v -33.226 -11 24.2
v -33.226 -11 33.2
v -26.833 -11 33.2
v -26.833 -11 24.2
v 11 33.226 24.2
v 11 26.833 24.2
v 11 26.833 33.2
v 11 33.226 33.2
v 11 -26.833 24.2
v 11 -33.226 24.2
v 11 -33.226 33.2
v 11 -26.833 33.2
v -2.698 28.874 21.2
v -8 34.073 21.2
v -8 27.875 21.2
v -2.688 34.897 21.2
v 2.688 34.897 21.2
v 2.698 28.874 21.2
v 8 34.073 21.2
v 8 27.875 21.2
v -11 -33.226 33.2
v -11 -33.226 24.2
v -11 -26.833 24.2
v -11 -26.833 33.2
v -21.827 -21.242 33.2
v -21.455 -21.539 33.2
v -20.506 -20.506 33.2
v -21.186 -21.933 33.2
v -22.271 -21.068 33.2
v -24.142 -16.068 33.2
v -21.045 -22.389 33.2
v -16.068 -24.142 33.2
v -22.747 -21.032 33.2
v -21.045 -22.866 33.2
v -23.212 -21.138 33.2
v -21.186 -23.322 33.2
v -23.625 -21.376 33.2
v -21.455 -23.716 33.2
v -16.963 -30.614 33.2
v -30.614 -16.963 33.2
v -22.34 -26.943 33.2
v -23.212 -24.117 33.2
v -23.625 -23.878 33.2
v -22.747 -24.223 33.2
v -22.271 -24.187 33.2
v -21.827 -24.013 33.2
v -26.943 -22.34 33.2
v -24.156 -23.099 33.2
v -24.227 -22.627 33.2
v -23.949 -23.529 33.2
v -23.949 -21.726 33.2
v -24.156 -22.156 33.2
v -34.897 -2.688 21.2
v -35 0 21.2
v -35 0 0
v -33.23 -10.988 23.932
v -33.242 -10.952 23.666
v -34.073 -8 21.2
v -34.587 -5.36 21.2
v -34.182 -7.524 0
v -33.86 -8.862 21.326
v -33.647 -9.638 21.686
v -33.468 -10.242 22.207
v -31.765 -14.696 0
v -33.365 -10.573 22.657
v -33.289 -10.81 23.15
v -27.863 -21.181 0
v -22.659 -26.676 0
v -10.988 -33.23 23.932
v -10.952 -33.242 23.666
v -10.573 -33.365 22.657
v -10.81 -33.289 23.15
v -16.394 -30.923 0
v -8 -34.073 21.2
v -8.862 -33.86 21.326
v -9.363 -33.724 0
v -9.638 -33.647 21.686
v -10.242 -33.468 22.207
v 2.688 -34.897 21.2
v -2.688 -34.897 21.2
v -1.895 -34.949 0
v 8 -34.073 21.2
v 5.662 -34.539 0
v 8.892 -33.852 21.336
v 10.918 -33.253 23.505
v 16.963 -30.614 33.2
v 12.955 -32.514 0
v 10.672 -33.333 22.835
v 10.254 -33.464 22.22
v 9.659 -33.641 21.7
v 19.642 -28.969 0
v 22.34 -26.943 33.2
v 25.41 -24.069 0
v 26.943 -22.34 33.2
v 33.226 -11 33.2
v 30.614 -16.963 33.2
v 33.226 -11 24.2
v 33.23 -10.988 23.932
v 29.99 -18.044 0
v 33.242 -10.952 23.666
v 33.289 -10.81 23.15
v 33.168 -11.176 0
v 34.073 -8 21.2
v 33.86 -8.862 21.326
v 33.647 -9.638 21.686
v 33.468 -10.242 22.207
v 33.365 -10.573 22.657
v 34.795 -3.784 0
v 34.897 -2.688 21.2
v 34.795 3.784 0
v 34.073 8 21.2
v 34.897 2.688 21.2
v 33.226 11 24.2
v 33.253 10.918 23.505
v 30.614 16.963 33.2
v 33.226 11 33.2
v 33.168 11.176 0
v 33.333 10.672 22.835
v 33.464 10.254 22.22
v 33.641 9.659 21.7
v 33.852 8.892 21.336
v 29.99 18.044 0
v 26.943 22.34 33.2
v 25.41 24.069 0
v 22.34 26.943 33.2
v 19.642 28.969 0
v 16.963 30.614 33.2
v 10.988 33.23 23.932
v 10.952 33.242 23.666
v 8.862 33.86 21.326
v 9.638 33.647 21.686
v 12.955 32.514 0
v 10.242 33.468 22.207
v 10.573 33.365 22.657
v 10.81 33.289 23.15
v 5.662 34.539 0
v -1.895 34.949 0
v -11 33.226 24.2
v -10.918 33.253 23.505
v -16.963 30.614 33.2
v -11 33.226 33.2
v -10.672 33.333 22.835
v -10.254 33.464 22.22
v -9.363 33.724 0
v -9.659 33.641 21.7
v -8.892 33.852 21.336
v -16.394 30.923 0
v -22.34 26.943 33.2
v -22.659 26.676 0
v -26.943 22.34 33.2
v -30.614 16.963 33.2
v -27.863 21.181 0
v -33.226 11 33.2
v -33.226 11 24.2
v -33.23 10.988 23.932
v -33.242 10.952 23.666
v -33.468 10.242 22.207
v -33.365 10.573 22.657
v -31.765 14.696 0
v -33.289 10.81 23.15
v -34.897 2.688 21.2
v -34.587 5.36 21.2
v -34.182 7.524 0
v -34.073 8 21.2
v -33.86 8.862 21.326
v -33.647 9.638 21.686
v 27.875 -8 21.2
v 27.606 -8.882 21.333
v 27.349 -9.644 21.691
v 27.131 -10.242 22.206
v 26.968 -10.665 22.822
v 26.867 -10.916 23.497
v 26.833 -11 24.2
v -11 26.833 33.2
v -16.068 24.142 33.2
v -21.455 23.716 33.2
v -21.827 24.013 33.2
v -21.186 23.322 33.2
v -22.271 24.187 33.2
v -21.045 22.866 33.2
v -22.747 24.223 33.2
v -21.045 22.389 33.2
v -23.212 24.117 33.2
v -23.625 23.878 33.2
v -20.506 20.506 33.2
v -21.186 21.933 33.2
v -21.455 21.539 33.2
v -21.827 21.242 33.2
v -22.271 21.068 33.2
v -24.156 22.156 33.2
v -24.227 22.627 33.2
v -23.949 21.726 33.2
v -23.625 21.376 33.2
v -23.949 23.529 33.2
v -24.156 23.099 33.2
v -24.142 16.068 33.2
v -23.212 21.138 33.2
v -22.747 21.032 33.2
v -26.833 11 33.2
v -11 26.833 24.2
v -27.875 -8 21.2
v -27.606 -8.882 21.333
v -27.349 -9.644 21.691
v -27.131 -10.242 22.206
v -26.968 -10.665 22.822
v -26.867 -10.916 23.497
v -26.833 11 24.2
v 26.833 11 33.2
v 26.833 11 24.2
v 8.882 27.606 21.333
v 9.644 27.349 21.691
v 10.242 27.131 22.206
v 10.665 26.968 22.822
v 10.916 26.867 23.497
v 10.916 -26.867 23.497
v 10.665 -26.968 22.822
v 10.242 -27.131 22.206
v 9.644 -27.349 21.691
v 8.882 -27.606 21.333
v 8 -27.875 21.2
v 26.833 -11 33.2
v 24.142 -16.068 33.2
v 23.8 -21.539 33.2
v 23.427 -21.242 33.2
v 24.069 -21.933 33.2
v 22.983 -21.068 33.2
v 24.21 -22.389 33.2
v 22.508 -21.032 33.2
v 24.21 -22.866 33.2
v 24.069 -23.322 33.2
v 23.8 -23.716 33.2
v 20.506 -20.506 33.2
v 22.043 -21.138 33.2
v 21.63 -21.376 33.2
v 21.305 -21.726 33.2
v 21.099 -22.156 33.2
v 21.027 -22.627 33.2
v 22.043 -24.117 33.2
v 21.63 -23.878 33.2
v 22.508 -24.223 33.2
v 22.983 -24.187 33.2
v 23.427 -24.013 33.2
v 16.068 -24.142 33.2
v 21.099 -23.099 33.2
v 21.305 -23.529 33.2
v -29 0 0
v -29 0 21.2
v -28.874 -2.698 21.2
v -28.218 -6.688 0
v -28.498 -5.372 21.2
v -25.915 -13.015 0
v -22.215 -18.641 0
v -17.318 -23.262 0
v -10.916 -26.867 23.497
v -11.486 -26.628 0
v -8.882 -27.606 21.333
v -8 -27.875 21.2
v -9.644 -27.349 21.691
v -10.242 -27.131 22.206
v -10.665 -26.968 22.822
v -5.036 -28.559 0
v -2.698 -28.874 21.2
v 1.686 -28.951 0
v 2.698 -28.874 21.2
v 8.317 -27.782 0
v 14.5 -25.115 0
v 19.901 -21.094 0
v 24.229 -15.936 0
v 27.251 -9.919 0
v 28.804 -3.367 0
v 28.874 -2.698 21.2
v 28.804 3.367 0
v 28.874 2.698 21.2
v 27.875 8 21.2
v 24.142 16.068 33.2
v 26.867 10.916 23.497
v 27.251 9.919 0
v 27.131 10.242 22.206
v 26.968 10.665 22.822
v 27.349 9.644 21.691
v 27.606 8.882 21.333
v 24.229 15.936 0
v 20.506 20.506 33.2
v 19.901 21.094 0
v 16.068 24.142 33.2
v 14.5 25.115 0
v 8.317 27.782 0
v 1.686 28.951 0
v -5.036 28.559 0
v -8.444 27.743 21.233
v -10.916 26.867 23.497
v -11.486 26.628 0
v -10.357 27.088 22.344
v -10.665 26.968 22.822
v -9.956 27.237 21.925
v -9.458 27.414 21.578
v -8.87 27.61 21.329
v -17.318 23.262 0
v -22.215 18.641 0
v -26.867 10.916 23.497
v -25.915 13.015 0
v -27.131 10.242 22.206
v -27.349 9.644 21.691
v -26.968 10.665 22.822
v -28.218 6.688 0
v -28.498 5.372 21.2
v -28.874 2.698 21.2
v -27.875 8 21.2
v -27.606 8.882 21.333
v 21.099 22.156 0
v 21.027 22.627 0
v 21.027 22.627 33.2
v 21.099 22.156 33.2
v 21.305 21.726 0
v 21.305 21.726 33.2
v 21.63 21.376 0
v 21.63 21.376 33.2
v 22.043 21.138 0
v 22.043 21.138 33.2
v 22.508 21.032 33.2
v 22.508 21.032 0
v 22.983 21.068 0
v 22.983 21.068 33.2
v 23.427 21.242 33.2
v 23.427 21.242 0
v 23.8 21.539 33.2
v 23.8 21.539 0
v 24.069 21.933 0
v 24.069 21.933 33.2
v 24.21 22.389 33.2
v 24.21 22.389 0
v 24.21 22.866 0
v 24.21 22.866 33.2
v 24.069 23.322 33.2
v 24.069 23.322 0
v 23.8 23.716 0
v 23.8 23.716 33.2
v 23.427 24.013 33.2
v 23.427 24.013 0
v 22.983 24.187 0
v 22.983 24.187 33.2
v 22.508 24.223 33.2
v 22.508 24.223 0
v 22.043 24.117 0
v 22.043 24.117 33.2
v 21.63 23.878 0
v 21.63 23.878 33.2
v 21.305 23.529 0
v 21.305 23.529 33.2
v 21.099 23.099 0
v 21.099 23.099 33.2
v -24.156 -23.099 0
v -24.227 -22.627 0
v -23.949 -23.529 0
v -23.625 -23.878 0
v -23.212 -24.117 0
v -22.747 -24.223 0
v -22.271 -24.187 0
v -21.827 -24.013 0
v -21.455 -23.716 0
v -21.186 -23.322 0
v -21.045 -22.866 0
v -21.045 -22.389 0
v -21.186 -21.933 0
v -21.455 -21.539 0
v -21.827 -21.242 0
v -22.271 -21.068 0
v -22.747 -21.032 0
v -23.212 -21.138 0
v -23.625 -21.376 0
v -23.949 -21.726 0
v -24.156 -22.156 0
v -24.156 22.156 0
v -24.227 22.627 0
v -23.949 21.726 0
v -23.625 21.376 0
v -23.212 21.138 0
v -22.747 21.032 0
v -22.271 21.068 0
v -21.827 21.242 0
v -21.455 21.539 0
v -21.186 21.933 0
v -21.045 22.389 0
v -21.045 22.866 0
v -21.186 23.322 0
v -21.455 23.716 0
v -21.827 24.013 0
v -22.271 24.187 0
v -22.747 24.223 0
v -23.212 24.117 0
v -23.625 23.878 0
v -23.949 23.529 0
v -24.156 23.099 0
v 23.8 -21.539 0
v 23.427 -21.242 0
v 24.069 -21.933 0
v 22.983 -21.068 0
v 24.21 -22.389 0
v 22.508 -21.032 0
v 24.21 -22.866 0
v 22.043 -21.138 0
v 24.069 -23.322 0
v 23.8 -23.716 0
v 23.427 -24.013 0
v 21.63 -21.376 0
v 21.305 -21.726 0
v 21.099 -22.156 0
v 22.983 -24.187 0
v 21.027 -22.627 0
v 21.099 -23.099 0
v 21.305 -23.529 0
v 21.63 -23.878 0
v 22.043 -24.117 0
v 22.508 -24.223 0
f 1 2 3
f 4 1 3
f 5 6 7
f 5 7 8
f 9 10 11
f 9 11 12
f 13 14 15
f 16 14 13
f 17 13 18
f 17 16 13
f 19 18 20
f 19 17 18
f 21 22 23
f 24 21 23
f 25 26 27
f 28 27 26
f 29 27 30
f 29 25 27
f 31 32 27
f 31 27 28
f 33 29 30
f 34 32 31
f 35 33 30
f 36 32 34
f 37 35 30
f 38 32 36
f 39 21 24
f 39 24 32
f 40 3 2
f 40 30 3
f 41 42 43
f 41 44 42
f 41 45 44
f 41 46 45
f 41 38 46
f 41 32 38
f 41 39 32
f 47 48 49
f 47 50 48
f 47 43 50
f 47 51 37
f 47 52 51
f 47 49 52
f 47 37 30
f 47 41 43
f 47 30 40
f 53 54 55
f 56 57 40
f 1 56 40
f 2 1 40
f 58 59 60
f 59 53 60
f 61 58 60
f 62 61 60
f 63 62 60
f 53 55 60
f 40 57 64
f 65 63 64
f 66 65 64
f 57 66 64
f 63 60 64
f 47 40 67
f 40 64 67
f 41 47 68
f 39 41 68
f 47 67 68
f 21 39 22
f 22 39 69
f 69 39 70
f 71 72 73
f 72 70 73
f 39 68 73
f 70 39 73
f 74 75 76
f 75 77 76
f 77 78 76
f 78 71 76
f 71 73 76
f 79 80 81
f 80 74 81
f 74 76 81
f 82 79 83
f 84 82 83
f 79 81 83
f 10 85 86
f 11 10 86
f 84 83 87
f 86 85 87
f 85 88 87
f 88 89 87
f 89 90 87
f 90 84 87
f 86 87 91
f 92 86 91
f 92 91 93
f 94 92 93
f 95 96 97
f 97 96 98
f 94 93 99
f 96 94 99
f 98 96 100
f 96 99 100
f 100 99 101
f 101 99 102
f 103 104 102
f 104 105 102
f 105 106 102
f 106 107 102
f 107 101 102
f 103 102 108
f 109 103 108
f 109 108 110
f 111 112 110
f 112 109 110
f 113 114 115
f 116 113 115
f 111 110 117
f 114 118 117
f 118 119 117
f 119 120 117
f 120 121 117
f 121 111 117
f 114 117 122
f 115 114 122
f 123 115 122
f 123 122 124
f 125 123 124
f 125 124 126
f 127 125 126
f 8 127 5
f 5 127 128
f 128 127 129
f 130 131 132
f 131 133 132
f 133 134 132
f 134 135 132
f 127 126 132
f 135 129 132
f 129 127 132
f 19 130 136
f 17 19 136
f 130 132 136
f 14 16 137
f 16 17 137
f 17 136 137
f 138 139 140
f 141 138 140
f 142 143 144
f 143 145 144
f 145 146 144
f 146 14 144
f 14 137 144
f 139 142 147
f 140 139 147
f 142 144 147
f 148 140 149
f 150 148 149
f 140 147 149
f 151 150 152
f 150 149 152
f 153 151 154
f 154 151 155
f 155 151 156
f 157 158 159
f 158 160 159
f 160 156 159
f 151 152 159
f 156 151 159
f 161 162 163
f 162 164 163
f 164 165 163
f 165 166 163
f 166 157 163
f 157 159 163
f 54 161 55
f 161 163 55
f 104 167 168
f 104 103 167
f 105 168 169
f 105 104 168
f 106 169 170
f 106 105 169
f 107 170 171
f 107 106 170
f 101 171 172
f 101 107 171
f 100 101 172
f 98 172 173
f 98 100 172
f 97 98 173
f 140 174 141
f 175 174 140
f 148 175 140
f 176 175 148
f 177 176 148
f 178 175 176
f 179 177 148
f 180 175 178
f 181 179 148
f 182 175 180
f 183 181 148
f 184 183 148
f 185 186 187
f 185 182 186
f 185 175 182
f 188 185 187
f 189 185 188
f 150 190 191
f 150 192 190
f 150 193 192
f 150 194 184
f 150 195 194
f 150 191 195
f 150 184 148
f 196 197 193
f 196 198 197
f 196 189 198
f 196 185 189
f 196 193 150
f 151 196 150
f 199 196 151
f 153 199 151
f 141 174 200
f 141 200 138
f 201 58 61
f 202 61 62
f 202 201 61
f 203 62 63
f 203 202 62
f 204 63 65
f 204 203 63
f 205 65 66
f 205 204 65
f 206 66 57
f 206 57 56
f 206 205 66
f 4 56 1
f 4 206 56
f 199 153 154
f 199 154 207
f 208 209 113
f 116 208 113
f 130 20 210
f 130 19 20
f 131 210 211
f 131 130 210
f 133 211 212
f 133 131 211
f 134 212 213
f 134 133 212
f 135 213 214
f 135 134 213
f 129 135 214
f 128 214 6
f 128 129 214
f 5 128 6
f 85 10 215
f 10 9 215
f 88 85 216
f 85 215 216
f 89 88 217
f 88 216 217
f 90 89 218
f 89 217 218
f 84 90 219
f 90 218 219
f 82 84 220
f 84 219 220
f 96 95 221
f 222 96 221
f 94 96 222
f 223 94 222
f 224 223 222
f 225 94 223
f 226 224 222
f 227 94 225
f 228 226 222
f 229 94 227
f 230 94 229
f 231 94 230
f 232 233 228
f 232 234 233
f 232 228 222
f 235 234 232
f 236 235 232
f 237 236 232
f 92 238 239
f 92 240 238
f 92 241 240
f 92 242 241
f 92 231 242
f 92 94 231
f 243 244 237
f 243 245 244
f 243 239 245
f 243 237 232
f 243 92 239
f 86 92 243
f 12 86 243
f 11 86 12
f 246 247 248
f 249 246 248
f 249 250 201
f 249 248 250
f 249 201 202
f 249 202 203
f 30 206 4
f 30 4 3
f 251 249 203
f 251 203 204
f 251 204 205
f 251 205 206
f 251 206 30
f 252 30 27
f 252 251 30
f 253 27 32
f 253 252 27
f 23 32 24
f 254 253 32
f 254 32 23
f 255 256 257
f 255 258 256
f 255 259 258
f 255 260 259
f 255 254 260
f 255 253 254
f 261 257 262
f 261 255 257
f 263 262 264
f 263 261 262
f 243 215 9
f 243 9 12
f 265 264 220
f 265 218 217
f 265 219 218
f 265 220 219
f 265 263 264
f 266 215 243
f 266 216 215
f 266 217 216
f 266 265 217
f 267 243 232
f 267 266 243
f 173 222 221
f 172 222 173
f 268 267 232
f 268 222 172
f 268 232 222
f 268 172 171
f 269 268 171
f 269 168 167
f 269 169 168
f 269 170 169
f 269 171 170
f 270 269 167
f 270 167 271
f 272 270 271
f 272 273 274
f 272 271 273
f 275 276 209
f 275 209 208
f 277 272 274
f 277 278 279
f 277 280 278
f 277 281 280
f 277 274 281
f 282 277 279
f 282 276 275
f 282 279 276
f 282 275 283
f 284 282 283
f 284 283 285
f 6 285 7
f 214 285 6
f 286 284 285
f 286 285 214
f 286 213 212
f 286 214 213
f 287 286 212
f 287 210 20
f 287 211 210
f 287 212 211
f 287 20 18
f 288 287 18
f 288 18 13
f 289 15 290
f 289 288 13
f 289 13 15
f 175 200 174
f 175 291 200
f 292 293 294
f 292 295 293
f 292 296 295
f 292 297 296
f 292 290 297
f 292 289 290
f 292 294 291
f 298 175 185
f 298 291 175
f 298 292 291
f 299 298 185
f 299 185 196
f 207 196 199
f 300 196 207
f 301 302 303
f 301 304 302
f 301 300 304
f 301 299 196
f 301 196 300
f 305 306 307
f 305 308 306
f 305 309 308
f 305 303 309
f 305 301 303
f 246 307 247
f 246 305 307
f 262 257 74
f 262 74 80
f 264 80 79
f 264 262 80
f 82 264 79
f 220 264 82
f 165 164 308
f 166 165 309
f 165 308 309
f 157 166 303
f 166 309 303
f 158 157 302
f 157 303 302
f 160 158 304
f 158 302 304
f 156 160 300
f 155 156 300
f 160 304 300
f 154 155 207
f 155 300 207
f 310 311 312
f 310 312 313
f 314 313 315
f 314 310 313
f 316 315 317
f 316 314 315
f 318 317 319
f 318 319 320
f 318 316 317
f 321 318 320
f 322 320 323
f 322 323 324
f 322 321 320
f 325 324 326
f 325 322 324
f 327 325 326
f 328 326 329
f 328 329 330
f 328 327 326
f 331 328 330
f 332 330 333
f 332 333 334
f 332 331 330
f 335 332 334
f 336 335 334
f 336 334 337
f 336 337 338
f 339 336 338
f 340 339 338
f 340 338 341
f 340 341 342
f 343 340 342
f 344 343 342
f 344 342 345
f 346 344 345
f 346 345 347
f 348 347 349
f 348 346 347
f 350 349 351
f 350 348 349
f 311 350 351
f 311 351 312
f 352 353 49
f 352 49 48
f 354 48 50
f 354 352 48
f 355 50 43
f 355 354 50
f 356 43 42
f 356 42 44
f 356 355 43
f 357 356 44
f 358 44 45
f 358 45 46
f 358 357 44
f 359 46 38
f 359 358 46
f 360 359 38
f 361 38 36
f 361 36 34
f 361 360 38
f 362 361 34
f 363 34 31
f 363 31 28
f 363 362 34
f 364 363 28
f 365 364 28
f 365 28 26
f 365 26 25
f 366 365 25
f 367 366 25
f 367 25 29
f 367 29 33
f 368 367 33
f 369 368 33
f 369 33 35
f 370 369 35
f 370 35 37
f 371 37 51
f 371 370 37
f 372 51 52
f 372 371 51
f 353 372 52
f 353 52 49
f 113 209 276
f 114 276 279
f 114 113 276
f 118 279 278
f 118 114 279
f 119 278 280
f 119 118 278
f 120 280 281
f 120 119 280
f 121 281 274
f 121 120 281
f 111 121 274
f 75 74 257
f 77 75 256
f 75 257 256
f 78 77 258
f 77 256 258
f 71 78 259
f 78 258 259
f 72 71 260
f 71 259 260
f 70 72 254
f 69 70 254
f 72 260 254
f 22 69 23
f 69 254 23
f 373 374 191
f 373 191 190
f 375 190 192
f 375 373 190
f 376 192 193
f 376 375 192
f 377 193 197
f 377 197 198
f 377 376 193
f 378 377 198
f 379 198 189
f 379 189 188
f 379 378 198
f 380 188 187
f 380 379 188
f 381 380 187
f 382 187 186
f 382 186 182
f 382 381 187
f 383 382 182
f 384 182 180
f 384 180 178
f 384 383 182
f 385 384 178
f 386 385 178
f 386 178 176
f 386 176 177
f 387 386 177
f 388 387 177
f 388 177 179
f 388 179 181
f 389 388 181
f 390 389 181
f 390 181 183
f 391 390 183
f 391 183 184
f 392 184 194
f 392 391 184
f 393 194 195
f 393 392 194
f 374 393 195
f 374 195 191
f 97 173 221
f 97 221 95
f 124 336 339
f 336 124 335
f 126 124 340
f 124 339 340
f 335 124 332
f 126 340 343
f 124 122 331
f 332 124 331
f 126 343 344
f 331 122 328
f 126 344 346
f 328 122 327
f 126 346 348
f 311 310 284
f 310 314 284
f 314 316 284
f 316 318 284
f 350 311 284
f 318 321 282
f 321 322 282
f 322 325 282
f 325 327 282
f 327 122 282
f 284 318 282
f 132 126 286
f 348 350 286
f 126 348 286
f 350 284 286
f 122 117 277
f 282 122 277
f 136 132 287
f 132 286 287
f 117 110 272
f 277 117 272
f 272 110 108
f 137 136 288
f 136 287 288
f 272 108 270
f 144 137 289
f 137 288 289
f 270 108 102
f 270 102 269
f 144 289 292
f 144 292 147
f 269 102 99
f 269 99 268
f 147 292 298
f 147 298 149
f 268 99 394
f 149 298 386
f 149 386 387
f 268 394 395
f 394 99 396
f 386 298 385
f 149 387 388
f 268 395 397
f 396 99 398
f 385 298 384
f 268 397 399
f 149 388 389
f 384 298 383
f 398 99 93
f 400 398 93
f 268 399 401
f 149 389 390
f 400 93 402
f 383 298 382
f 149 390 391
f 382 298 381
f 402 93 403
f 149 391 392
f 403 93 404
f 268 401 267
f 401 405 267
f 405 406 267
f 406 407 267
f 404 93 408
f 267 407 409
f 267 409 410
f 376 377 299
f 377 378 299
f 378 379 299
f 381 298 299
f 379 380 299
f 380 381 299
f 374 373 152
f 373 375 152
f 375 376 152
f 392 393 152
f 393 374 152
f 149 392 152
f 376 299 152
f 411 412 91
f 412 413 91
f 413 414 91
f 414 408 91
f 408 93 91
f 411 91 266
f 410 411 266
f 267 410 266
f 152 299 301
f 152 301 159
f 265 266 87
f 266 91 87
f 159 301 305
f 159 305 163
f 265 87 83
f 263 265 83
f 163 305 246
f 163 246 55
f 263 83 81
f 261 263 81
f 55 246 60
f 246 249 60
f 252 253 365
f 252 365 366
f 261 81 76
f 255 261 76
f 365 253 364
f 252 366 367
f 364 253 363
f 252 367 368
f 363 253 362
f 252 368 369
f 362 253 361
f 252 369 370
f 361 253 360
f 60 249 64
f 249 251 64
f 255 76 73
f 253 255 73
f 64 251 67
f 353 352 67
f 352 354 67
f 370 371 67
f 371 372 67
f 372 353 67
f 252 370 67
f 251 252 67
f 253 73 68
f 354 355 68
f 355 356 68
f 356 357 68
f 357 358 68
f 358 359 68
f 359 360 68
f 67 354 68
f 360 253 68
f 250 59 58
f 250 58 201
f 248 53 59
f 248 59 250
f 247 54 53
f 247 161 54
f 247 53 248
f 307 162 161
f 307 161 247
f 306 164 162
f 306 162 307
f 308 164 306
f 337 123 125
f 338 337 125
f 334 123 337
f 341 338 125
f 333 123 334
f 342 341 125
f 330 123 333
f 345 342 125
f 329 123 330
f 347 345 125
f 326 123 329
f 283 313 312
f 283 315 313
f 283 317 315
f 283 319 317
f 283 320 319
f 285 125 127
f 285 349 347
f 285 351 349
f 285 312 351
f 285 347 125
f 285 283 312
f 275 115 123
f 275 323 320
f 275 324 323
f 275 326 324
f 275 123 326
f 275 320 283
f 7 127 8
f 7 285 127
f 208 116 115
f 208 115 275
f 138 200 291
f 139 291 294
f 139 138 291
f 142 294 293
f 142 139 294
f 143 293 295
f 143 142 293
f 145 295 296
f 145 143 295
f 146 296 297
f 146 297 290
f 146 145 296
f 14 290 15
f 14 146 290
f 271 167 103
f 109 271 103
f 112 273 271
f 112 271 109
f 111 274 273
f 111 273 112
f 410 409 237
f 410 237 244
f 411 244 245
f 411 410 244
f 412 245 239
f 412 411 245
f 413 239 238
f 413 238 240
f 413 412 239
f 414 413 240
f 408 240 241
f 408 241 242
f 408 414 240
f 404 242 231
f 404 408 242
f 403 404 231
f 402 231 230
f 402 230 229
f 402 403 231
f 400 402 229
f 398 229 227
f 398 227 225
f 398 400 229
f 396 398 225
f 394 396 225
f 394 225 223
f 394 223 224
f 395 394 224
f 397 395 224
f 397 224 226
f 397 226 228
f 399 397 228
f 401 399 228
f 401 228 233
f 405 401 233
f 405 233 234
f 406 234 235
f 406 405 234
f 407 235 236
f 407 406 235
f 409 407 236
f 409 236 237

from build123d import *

# Parameters (mm, degrees)
SKETCH_1_R          = 35
SKETCH_1_R_2        = 29
SKETCH_1_R_3        = 1.6
EXTRUDE_1_DEPTH     = 33.2
SKETCH_3_W          = 22
SKETCH_3_H          = 23.089675748
SKETCH_3_W_2        = 23.089675748
SKETCH_3_H_2        = 22
CUT_EXTRUDE_1_DEPTH = 12
FILLET_1_R          = 3


with BuildPart() as part:
    # 草图1 → 凸台-拉伸1 (new body)
    with BuildSketch(Plane.XY):
        with Locations(Location((0, 0, 0), (0, 0, 180))):
            Circle(SKETCH_1_R)
        with Locations(Location((0, 0, 0), (0, 0, 180))):
            Circle(SKETCH_1_R_2, mode=Mode.SUBTRACT)
        with Locations(Location((-22.627416998, 22.627416998, 0), (0, 0, 180))):
            Circle(SKETCH_1_R_3, mode=Mode.SUBTRACT)
        with Locations(Location((22.627416998, 22.627416998, 0), (0, 0, 180))):
            Circle(SKETCH_1_R_3, mode=Mode.SUBTRACT)
        with Locations(Location((22.627416998, -22.627416998, 0), (0, 0, 180))):
            Circle(SKETCH_1_R_3, mode=Mode.SUBTRACT)
        with Locations(Location((-22.627416998, -22.627416998, 0), (0, 0, 180))):
            Circle(SKETCH_1_R_3, mode=Mode.SUBTRACT)
    extrude(amount=EXTRUDE_1_DEPTH)

    # 草图3 → 切除-拉伸1 (cut)
    with BuildSketch(Plane.XY.offset(33.2)):
        with Locations((0, 32.883523325)):
            Rectangle(SKETCH_3_W, SKETCH_3_H)
        with Locations((32.883523325, 0)):
            Rectangle(SKETCH_3_W_2, SKETCH_3_H_2)
        with Locations((0, -32.883523325)):
            Rectangle(SKETCH_3_W, SKETCH_3_H)
        with Locations((-32.883523325, 0)):
            Rectangle(SKETCH_3_W_2, SKETCH_3_H_2)
    extrude(amount=-CUT_EXTRUDE_1_DEPTH, mode=Mode.SUBTRACT)

    # 圆角1
    fillet_1_edges = [part.edges().sort_by_distance(p)[0] for p in [
        (-11, 30.029655591, 21.2),
        (11, 30.029655591, 21.2),
        (30.029655591, 11, 21.2),
        (30.029655591, -11, 21.2),
        (11, -30.029655591, 21.2),
        (-11, -30.029655591, 21.2),
        (-30.029655591, -11, 21.2),
        (-30.029655591, 11, 21.2),
    ]]
    fillet(fillet_1_edges, radius=FILLET_1_R)


solid = part.part
